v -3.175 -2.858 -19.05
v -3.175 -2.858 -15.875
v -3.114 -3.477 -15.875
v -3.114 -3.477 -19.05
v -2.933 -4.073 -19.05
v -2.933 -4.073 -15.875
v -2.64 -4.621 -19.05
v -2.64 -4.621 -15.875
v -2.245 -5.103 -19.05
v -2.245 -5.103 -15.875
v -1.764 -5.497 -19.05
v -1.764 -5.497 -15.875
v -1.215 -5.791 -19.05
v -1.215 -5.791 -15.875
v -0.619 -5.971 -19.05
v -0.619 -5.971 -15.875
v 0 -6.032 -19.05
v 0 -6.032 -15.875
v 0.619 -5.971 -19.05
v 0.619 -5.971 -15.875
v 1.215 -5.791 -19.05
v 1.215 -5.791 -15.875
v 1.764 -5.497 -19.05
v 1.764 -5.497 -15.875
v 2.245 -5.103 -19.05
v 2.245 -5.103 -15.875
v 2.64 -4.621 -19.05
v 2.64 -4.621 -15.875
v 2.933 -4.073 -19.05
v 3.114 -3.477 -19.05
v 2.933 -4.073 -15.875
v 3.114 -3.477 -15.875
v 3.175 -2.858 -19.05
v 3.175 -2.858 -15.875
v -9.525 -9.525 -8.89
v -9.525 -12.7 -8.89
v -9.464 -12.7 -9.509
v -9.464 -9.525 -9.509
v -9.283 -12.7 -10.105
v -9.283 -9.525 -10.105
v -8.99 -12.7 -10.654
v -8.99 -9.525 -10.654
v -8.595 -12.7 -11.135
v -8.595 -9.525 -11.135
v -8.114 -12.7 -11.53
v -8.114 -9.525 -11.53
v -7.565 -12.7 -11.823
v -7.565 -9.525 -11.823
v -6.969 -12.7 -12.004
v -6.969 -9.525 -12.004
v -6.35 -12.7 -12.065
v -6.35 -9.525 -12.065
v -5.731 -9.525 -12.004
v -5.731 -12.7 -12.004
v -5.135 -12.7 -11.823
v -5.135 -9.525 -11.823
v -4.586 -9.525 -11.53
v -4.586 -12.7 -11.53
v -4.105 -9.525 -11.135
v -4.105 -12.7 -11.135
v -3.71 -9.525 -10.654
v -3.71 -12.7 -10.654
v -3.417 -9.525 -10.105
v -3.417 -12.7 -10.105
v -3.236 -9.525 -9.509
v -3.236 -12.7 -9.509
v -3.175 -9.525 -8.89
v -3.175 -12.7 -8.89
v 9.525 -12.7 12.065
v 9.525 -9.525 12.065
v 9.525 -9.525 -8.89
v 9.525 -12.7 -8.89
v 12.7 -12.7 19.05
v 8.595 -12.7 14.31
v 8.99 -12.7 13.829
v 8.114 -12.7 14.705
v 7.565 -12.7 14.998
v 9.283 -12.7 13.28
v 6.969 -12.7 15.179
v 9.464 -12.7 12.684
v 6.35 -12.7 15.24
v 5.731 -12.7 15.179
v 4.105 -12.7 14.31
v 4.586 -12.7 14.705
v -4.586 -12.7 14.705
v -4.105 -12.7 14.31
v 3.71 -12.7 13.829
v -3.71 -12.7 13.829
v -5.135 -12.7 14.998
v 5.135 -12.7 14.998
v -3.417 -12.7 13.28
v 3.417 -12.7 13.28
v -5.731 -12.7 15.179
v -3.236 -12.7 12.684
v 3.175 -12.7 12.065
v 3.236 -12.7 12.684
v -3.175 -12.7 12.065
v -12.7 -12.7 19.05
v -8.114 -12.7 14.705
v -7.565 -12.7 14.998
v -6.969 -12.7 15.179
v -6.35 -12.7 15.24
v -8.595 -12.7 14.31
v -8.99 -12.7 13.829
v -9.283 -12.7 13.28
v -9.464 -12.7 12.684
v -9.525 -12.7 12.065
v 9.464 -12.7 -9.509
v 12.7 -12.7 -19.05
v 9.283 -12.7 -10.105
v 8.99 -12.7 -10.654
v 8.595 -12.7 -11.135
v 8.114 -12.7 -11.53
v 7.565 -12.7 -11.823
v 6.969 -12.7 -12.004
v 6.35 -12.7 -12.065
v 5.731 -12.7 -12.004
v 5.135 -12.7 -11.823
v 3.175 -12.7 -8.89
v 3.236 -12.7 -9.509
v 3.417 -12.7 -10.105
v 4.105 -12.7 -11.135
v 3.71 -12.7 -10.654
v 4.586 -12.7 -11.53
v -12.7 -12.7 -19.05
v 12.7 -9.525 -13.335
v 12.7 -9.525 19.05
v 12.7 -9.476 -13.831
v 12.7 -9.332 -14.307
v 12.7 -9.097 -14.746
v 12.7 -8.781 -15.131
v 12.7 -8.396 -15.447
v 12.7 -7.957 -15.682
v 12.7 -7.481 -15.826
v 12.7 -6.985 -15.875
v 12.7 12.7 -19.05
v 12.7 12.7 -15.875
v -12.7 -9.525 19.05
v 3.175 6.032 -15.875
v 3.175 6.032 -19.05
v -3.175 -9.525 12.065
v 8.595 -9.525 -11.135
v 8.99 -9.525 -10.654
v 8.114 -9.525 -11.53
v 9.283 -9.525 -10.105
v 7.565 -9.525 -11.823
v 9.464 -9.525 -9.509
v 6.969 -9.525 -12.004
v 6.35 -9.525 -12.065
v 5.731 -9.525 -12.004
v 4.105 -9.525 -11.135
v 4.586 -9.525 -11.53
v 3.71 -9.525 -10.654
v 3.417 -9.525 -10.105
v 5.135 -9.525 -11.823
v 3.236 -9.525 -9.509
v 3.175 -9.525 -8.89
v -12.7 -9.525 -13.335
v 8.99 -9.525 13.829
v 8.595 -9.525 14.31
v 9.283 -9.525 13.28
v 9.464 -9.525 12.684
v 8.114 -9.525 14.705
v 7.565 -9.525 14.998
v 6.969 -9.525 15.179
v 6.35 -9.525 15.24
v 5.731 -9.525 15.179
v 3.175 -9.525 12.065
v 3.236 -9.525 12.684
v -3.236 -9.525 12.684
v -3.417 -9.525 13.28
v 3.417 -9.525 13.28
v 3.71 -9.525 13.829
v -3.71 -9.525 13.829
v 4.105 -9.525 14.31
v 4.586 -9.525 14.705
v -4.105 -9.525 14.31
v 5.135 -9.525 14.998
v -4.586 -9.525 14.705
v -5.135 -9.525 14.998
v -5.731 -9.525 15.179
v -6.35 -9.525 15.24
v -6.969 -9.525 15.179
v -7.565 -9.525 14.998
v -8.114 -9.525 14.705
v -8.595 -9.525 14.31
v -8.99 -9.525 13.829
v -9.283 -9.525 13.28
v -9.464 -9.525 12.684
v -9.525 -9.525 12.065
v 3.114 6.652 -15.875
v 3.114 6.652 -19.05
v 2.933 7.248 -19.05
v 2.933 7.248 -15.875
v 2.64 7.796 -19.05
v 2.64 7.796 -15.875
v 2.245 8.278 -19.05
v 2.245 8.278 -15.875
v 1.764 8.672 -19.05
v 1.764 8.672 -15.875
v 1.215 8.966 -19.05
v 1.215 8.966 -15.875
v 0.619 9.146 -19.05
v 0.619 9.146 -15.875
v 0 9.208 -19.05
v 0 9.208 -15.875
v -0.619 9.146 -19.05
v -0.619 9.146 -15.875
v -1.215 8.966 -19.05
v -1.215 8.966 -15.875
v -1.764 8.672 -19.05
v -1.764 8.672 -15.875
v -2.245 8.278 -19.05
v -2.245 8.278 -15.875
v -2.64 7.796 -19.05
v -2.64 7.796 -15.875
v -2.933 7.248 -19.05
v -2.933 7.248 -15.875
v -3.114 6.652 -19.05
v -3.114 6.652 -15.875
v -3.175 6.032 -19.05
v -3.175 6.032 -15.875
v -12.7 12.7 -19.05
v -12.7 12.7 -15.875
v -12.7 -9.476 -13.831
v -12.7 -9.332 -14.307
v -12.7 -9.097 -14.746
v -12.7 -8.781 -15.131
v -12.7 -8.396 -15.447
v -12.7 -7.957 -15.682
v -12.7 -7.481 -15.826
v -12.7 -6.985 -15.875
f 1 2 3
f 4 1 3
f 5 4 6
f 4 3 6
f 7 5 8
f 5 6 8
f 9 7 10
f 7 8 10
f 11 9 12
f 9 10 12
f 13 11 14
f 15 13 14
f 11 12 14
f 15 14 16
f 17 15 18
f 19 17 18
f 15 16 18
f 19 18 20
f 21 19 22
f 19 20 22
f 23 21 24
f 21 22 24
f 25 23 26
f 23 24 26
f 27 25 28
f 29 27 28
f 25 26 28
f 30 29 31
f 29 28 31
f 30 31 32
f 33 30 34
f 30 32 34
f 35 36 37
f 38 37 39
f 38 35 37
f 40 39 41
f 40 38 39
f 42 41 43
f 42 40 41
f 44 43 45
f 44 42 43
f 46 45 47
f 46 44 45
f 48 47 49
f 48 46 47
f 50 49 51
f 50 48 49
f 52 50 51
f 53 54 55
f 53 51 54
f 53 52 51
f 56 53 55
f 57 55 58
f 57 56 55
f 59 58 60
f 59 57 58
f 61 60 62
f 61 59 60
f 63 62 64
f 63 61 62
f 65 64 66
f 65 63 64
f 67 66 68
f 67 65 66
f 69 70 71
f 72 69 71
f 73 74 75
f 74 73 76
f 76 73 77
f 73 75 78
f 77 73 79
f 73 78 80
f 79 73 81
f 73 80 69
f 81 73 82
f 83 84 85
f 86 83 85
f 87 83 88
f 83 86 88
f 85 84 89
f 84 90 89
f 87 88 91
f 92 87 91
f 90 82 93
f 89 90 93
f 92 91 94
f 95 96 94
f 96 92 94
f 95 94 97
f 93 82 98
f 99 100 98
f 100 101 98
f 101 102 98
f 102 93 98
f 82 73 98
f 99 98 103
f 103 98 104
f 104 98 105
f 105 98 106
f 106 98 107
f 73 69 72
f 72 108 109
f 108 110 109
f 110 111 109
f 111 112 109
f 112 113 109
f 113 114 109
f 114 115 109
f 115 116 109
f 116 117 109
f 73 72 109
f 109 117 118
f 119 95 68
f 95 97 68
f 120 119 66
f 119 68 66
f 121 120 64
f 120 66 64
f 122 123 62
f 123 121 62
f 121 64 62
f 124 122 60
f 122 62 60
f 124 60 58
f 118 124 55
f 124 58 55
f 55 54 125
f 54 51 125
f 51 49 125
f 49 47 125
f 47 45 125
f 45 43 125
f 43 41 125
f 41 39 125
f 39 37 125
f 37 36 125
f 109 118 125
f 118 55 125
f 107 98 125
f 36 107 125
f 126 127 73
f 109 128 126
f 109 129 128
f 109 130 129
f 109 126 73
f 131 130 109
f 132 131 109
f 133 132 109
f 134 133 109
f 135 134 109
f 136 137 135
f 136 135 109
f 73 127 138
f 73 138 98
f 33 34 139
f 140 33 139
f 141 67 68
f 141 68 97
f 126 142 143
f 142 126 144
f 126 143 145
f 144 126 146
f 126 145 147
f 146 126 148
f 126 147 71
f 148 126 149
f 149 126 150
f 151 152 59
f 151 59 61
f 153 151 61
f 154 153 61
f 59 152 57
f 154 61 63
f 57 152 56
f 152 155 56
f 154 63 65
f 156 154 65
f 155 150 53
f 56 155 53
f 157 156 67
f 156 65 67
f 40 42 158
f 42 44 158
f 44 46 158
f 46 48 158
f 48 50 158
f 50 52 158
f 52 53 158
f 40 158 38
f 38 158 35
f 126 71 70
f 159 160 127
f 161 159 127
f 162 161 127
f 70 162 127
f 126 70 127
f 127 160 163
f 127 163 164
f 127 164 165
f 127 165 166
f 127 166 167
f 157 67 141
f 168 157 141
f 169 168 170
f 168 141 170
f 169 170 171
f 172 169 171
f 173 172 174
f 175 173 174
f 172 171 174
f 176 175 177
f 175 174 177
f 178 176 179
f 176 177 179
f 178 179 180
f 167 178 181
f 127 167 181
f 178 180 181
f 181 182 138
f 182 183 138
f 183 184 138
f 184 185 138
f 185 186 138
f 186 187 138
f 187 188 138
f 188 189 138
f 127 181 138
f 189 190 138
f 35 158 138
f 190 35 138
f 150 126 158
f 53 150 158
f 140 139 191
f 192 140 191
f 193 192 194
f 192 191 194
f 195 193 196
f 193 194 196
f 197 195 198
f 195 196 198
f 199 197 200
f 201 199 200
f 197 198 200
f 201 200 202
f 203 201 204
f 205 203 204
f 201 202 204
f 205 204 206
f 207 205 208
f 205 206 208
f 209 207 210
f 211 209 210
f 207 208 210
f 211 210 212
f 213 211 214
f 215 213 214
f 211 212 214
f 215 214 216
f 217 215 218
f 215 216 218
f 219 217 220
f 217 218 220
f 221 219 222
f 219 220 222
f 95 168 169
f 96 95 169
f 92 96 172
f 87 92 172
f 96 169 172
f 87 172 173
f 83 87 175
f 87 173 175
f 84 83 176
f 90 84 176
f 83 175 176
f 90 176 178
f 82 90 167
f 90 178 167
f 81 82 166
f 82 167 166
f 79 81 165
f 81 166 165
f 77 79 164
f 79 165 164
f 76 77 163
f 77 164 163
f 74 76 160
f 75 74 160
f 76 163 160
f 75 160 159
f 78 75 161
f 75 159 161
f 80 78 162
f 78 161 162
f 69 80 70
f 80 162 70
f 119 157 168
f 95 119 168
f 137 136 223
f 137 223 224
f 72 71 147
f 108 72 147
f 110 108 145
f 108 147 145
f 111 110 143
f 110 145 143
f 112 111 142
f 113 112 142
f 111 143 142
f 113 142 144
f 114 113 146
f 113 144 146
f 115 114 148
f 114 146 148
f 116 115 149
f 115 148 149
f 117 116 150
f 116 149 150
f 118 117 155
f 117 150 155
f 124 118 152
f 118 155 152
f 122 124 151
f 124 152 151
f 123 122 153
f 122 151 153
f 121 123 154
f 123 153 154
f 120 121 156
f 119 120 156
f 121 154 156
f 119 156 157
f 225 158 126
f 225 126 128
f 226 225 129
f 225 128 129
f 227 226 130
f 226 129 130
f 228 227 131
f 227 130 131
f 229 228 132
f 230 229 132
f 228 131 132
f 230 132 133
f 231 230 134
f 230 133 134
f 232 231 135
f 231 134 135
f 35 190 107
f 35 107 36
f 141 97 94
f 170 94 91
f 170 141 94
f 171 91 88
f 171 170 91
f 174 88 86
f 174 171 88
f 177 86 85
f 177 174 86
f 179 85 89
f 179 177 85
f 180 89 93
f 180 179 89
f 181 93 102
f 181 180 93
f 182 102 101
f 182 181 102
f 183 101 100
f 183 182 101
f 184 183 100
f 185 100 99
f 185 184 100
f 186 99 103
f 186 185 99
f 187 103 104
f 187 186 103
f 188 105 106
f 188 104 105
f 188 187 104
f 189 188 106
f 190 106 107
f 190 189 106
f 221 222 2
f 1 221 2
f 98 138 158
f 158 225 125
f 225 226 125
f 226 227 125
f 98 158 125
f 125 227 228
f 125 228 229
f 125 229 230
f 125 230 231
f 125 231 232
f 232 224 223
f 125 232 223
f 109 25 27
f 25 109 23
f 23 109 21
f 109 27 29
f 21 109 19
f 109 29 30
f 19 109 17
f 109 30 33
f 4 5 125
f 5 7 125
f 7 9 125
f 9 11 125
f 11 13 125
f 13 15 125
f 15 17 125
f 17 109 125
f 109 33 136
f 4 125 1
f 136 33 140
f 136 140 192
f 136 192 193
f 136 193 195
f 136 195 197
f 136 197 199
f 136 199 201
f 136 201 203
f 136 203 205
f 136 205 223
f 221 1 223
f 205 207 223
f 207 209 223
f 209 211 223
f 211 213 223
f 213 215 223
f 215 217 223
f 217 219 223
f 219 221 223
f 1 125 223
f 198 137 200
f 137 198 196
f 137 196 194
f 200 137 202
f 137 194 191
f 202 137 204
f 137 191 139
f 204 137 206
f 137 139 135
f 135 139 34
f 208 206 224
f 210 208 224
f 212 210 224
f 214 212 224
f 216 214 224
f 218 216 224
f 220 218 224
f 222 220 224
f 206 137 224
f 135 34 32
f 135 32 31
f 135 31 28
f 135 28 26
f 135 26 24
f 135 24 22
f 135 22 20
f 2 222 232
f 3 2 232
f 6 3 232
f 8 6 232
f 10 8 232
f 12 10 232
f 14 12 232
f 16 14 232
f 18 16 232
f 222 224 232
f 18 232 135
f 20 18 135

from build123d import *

# Parameters (mm, degrees)
BOSS_EXTRUDE1_DEPTH      = 12.7
BOSS_EXTRUDE1_DEPTH_BACK = 12.7
CUT_EXTRUDE1_DEPTH       = 40.272581084
CUT_EXTRUDE2_DEPTH       = 38.1
FILLET1_R                = 2.54


with BuildPart() as part:
    # Sketch2 → Boss-Extrude1 (new, two sides: drawn at the far end of the back side and taken through both)
    with BuildSketch(Plane(origin=(0, 0, 0), x_dir=(0, 0, -1), z_dir=(1, 0, 0)).offset(-BOSS_EXTRUDE1_DEPTH_BACK)):
        Polygon((15.875, -9.525), (-19.05, -9.525), (-19.05, -12.7), (19.05, -12.7), (19.05, 12.7), (15.875, 12.7), align=None)
    extrude(amount=BOSS_EXTRUDE1_DEPTH + BOSS_EXTRUDE1_DEPTH_BACK)

    # Sketch4 → Cut-Extrude1 (cut, through all)
    with BuildSketch(Plane.XY.offset(-15.875)):
        with BuildLine():
            Line((-3.175, 6.0325), (-3.175, -2.8575))
            ThreePointArc((-3.175, -2.8575), (0, -6.0325), (3.175, -2.8575))
            Line((3.175, -2.8575), (3.175, 6.0325))
            ThreePointArc((3.175, 6.0325), (0, 9.2075), (-3.175, 6.0325))
        make_face()
    extrude(amount=-CUT_EXTRUDE1_DEPTH, mode=Mode.SUBTRACT)

    # Sketch5 → Cut-Extrude2 (cut)
    with BuildSketch(Plane(origin=(0, -9.525, 0), x_dir=(1, 0, 0), z_dir=(0, 1, 0))):
        with BuildLine():
            Line((-3.175, 8.89), (-3.175, -12.065))
            ThreePointArc((-3.175, -12.065), (-6.35, -15.24), (-9.525, -12.065))
            Line((-9.525, -12.065), (-9.525, 8.89))
            ThreePointArc((-9.525, 8.89), (-6.35, 12.065), (-3.175, 8.89))
        make_face()
        with BuildLine():
            Line((3.175, 8.89), (3.175, -12.065))
            ThreePointArc((3.175, -12.065), (6.35, -15.24), (9.525, -12.065))
            Line((9.525, -12.065), (9.525, 8.89))
            ThreePointArc((9.525, 8.89), (6.35, 12.065), (3.175, 8.89))
        make_face()
    extrude(amount=-CUT_EXTRUDE2_DEPTH, mode=Mode.SUBTRACT)

    # Fillet1
    fillet1_edges = [part.edges().sort_by_distance(p)[0] for p in [
        (0, -9.525, -15.875),
    ]]
    fillet(fillet1_edges, radius=FILLET1_R)


solid = part.part
